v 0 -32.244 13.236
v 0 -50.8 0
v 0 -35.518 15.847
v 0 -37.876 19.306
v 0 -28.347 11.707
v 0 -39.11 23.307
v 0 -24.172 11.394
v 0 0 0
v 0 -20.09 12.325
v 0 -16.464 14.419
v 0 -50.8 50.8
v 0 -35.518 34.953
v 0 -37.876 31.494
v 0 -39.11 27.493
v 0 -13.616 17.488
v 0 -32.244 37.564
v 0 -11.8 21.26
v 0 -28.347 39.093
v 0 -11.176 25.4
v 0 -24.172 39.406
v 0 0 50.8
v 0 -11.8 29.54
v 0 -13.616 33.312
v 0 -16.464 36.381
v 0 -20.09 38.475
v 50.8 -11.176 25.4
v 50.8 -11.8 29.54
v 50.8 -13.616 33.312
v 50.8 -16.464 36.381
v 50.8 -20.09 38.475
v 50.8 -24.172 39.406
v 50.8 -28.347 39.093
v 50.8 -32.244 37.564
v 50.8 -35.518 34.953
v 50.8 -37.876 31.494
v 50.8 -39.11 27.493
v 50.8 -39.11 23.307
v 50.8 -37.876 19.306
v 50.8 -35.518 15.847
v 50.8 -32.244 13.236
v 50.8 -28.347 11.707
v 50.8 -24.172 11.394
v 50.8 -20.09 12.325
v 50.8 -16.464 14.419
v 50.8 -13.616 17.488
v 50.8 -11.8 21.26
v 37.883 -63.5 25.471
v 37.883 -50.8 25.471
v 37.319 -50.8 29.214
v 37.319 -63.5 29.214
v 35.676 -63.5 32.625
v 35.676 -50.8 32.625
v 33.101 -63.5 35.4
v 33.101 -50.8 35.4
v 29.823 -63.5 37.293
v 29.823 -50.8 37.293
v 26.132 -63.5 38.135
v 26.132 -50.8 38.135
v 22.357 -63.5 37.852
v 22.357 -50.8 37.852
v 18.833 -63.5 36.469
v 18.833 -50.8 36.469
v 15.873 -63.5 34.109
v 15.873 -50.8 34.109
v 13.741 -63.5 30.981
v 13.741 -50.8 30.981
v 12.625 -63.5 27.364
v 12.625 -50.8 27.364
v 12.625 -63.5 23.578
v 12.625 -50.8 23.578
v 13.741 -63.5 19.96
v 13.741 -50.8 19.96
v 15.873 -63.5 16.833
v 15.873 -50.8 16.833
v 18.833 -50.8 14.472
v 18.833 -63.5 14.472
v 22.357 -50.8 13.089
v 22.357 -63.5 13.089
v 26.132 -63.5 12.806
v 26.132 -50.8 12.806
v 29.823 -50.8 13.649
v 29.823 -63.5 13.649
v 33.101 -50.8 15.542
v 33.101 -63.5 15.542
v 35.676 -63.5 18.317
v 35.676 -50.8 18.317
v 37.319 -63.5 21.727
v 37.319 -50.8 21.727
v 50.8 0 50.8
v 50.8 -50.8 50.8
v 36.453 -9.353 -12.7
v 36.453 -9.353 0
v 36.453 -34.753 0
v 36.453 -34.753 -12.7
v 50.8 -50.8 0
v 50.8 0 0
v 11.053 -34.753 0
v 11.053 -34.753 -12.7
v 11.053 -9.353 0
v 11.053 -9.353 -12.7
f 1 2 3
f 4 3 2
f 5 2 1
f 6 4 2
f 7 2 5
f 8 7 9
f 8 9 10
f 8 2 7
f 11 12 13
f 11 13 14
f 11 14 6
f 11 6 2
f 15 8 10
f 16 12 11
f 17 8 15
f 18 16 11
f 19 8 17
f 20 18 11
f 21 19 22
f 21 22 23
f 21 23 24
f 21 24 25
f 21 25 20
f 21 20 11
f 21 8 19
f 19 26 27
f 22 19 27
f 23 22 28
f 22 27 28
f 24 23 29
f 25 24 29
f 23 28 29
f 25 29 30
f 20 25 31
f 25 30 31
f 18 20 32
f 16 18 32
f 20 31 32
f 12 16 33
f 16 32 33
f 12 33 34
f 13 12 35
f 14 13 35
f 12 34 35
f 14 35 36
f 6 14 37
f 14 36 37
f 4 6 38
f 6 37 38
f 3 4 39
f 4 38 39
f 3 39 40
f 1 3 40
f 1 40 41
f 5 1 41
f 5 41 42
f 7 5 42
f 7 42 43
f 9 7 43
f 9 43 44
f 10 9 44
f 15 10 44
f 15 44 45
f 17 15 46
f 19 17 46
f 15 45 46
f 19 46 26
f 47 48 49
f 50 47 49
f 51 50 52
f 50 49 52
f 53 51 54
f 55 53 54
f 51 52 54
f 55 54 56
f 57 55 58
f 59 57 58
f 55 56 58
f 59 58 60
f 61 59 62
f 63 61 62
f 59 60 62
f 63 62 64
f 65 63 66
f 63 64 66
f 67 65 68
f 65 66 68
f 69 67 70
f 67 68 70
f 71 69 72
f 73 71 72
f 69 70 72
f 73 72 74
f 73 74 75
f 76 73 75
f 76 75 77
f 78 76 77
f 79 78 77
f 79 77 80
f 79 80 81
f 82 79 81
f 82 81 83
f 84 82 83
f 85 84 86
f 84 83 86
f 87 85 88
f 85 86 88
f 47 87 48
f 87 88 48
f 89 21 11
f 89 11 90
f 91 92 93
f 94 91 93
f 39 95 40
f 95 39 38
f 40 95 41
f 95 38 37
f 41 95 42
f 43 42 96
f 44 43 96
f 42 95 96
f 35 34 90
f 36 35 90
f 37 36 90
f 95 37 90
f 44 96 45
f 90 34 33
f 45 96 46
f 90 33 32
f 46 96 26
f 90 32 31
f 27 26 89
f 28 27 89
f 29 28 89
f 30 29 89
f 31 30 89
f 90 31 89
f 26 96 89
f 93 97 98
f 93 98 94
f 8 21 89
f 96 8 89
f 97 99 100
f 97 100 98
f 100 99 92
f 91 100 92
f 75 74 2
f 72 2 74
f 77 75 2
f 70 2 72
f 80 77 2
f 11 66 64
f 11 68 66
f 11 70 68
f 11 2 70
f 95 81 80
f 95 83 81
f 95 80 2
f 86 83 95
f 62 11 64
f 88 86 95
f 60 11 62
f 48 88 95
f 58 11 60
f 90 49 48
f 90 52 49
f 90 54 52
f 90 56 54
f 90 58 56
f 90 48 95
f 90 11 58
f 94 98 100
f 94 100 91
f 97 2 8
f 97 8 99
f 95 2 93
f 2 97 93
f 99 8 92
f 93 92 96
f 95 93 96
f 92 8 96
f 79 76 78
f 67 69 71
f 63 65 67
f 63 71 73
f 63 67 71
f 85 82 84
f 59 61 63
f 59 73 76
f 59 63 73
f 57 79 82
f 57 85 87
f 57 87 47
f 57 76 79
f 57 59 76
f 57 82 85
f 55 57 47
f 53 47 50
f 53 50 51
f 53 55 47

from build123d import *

# Parameters (mm, degrees)
F0_W     = 50.8
F0_H     = 50.8
F1_DEPTH = 50.8
F2_R     = 12.7
F3_DEPTH = 12.7
F4_R     = 14.045612
F5_DEPTH = 50.8
F6_W     = 25.4
F6_H     = 25.4
F7_DEPTH = 12.7


with BuildPart() as f1:
    # F0 (on Front) → F1 (new body)
    with BuildSketch(Plane.XZ):
        with Locations((25.4, 25.4)):
            Rectangle(F0_W, F0_H)
    extrude(amount=F1_DEPTH)

    # F2 (on face) → F3 (join)
    with BuildSketch(Plane.XZ.offset(50.8)):
        with Locations((25.183003, 25.47081)):
            Circle(F2_R)
    extrude(amount=F3_DEPTH)

    # F4 (on face) → F5 (cut)
    with BuildSketch(Plane.YZ.offset(50.8)):
        with Locations((-25.221433, 25.4)):
            Circle(F4_R)
    extrude(amount=-F5_DEPTH, mode=Mode.SUBTRACT)

    # F6 (on face) → F7 (join)
    with BuildSketch(Plane(origin=(0, 0, 0), x_dir=(1, 0, 0), z_dir=(0, 0, -1))):
        with Locations((23.752804, 22.052956)):
            Rectangle(F6_W, F6_H)
    extrude(amount=F7_DEPTH)


solid = f1.part
